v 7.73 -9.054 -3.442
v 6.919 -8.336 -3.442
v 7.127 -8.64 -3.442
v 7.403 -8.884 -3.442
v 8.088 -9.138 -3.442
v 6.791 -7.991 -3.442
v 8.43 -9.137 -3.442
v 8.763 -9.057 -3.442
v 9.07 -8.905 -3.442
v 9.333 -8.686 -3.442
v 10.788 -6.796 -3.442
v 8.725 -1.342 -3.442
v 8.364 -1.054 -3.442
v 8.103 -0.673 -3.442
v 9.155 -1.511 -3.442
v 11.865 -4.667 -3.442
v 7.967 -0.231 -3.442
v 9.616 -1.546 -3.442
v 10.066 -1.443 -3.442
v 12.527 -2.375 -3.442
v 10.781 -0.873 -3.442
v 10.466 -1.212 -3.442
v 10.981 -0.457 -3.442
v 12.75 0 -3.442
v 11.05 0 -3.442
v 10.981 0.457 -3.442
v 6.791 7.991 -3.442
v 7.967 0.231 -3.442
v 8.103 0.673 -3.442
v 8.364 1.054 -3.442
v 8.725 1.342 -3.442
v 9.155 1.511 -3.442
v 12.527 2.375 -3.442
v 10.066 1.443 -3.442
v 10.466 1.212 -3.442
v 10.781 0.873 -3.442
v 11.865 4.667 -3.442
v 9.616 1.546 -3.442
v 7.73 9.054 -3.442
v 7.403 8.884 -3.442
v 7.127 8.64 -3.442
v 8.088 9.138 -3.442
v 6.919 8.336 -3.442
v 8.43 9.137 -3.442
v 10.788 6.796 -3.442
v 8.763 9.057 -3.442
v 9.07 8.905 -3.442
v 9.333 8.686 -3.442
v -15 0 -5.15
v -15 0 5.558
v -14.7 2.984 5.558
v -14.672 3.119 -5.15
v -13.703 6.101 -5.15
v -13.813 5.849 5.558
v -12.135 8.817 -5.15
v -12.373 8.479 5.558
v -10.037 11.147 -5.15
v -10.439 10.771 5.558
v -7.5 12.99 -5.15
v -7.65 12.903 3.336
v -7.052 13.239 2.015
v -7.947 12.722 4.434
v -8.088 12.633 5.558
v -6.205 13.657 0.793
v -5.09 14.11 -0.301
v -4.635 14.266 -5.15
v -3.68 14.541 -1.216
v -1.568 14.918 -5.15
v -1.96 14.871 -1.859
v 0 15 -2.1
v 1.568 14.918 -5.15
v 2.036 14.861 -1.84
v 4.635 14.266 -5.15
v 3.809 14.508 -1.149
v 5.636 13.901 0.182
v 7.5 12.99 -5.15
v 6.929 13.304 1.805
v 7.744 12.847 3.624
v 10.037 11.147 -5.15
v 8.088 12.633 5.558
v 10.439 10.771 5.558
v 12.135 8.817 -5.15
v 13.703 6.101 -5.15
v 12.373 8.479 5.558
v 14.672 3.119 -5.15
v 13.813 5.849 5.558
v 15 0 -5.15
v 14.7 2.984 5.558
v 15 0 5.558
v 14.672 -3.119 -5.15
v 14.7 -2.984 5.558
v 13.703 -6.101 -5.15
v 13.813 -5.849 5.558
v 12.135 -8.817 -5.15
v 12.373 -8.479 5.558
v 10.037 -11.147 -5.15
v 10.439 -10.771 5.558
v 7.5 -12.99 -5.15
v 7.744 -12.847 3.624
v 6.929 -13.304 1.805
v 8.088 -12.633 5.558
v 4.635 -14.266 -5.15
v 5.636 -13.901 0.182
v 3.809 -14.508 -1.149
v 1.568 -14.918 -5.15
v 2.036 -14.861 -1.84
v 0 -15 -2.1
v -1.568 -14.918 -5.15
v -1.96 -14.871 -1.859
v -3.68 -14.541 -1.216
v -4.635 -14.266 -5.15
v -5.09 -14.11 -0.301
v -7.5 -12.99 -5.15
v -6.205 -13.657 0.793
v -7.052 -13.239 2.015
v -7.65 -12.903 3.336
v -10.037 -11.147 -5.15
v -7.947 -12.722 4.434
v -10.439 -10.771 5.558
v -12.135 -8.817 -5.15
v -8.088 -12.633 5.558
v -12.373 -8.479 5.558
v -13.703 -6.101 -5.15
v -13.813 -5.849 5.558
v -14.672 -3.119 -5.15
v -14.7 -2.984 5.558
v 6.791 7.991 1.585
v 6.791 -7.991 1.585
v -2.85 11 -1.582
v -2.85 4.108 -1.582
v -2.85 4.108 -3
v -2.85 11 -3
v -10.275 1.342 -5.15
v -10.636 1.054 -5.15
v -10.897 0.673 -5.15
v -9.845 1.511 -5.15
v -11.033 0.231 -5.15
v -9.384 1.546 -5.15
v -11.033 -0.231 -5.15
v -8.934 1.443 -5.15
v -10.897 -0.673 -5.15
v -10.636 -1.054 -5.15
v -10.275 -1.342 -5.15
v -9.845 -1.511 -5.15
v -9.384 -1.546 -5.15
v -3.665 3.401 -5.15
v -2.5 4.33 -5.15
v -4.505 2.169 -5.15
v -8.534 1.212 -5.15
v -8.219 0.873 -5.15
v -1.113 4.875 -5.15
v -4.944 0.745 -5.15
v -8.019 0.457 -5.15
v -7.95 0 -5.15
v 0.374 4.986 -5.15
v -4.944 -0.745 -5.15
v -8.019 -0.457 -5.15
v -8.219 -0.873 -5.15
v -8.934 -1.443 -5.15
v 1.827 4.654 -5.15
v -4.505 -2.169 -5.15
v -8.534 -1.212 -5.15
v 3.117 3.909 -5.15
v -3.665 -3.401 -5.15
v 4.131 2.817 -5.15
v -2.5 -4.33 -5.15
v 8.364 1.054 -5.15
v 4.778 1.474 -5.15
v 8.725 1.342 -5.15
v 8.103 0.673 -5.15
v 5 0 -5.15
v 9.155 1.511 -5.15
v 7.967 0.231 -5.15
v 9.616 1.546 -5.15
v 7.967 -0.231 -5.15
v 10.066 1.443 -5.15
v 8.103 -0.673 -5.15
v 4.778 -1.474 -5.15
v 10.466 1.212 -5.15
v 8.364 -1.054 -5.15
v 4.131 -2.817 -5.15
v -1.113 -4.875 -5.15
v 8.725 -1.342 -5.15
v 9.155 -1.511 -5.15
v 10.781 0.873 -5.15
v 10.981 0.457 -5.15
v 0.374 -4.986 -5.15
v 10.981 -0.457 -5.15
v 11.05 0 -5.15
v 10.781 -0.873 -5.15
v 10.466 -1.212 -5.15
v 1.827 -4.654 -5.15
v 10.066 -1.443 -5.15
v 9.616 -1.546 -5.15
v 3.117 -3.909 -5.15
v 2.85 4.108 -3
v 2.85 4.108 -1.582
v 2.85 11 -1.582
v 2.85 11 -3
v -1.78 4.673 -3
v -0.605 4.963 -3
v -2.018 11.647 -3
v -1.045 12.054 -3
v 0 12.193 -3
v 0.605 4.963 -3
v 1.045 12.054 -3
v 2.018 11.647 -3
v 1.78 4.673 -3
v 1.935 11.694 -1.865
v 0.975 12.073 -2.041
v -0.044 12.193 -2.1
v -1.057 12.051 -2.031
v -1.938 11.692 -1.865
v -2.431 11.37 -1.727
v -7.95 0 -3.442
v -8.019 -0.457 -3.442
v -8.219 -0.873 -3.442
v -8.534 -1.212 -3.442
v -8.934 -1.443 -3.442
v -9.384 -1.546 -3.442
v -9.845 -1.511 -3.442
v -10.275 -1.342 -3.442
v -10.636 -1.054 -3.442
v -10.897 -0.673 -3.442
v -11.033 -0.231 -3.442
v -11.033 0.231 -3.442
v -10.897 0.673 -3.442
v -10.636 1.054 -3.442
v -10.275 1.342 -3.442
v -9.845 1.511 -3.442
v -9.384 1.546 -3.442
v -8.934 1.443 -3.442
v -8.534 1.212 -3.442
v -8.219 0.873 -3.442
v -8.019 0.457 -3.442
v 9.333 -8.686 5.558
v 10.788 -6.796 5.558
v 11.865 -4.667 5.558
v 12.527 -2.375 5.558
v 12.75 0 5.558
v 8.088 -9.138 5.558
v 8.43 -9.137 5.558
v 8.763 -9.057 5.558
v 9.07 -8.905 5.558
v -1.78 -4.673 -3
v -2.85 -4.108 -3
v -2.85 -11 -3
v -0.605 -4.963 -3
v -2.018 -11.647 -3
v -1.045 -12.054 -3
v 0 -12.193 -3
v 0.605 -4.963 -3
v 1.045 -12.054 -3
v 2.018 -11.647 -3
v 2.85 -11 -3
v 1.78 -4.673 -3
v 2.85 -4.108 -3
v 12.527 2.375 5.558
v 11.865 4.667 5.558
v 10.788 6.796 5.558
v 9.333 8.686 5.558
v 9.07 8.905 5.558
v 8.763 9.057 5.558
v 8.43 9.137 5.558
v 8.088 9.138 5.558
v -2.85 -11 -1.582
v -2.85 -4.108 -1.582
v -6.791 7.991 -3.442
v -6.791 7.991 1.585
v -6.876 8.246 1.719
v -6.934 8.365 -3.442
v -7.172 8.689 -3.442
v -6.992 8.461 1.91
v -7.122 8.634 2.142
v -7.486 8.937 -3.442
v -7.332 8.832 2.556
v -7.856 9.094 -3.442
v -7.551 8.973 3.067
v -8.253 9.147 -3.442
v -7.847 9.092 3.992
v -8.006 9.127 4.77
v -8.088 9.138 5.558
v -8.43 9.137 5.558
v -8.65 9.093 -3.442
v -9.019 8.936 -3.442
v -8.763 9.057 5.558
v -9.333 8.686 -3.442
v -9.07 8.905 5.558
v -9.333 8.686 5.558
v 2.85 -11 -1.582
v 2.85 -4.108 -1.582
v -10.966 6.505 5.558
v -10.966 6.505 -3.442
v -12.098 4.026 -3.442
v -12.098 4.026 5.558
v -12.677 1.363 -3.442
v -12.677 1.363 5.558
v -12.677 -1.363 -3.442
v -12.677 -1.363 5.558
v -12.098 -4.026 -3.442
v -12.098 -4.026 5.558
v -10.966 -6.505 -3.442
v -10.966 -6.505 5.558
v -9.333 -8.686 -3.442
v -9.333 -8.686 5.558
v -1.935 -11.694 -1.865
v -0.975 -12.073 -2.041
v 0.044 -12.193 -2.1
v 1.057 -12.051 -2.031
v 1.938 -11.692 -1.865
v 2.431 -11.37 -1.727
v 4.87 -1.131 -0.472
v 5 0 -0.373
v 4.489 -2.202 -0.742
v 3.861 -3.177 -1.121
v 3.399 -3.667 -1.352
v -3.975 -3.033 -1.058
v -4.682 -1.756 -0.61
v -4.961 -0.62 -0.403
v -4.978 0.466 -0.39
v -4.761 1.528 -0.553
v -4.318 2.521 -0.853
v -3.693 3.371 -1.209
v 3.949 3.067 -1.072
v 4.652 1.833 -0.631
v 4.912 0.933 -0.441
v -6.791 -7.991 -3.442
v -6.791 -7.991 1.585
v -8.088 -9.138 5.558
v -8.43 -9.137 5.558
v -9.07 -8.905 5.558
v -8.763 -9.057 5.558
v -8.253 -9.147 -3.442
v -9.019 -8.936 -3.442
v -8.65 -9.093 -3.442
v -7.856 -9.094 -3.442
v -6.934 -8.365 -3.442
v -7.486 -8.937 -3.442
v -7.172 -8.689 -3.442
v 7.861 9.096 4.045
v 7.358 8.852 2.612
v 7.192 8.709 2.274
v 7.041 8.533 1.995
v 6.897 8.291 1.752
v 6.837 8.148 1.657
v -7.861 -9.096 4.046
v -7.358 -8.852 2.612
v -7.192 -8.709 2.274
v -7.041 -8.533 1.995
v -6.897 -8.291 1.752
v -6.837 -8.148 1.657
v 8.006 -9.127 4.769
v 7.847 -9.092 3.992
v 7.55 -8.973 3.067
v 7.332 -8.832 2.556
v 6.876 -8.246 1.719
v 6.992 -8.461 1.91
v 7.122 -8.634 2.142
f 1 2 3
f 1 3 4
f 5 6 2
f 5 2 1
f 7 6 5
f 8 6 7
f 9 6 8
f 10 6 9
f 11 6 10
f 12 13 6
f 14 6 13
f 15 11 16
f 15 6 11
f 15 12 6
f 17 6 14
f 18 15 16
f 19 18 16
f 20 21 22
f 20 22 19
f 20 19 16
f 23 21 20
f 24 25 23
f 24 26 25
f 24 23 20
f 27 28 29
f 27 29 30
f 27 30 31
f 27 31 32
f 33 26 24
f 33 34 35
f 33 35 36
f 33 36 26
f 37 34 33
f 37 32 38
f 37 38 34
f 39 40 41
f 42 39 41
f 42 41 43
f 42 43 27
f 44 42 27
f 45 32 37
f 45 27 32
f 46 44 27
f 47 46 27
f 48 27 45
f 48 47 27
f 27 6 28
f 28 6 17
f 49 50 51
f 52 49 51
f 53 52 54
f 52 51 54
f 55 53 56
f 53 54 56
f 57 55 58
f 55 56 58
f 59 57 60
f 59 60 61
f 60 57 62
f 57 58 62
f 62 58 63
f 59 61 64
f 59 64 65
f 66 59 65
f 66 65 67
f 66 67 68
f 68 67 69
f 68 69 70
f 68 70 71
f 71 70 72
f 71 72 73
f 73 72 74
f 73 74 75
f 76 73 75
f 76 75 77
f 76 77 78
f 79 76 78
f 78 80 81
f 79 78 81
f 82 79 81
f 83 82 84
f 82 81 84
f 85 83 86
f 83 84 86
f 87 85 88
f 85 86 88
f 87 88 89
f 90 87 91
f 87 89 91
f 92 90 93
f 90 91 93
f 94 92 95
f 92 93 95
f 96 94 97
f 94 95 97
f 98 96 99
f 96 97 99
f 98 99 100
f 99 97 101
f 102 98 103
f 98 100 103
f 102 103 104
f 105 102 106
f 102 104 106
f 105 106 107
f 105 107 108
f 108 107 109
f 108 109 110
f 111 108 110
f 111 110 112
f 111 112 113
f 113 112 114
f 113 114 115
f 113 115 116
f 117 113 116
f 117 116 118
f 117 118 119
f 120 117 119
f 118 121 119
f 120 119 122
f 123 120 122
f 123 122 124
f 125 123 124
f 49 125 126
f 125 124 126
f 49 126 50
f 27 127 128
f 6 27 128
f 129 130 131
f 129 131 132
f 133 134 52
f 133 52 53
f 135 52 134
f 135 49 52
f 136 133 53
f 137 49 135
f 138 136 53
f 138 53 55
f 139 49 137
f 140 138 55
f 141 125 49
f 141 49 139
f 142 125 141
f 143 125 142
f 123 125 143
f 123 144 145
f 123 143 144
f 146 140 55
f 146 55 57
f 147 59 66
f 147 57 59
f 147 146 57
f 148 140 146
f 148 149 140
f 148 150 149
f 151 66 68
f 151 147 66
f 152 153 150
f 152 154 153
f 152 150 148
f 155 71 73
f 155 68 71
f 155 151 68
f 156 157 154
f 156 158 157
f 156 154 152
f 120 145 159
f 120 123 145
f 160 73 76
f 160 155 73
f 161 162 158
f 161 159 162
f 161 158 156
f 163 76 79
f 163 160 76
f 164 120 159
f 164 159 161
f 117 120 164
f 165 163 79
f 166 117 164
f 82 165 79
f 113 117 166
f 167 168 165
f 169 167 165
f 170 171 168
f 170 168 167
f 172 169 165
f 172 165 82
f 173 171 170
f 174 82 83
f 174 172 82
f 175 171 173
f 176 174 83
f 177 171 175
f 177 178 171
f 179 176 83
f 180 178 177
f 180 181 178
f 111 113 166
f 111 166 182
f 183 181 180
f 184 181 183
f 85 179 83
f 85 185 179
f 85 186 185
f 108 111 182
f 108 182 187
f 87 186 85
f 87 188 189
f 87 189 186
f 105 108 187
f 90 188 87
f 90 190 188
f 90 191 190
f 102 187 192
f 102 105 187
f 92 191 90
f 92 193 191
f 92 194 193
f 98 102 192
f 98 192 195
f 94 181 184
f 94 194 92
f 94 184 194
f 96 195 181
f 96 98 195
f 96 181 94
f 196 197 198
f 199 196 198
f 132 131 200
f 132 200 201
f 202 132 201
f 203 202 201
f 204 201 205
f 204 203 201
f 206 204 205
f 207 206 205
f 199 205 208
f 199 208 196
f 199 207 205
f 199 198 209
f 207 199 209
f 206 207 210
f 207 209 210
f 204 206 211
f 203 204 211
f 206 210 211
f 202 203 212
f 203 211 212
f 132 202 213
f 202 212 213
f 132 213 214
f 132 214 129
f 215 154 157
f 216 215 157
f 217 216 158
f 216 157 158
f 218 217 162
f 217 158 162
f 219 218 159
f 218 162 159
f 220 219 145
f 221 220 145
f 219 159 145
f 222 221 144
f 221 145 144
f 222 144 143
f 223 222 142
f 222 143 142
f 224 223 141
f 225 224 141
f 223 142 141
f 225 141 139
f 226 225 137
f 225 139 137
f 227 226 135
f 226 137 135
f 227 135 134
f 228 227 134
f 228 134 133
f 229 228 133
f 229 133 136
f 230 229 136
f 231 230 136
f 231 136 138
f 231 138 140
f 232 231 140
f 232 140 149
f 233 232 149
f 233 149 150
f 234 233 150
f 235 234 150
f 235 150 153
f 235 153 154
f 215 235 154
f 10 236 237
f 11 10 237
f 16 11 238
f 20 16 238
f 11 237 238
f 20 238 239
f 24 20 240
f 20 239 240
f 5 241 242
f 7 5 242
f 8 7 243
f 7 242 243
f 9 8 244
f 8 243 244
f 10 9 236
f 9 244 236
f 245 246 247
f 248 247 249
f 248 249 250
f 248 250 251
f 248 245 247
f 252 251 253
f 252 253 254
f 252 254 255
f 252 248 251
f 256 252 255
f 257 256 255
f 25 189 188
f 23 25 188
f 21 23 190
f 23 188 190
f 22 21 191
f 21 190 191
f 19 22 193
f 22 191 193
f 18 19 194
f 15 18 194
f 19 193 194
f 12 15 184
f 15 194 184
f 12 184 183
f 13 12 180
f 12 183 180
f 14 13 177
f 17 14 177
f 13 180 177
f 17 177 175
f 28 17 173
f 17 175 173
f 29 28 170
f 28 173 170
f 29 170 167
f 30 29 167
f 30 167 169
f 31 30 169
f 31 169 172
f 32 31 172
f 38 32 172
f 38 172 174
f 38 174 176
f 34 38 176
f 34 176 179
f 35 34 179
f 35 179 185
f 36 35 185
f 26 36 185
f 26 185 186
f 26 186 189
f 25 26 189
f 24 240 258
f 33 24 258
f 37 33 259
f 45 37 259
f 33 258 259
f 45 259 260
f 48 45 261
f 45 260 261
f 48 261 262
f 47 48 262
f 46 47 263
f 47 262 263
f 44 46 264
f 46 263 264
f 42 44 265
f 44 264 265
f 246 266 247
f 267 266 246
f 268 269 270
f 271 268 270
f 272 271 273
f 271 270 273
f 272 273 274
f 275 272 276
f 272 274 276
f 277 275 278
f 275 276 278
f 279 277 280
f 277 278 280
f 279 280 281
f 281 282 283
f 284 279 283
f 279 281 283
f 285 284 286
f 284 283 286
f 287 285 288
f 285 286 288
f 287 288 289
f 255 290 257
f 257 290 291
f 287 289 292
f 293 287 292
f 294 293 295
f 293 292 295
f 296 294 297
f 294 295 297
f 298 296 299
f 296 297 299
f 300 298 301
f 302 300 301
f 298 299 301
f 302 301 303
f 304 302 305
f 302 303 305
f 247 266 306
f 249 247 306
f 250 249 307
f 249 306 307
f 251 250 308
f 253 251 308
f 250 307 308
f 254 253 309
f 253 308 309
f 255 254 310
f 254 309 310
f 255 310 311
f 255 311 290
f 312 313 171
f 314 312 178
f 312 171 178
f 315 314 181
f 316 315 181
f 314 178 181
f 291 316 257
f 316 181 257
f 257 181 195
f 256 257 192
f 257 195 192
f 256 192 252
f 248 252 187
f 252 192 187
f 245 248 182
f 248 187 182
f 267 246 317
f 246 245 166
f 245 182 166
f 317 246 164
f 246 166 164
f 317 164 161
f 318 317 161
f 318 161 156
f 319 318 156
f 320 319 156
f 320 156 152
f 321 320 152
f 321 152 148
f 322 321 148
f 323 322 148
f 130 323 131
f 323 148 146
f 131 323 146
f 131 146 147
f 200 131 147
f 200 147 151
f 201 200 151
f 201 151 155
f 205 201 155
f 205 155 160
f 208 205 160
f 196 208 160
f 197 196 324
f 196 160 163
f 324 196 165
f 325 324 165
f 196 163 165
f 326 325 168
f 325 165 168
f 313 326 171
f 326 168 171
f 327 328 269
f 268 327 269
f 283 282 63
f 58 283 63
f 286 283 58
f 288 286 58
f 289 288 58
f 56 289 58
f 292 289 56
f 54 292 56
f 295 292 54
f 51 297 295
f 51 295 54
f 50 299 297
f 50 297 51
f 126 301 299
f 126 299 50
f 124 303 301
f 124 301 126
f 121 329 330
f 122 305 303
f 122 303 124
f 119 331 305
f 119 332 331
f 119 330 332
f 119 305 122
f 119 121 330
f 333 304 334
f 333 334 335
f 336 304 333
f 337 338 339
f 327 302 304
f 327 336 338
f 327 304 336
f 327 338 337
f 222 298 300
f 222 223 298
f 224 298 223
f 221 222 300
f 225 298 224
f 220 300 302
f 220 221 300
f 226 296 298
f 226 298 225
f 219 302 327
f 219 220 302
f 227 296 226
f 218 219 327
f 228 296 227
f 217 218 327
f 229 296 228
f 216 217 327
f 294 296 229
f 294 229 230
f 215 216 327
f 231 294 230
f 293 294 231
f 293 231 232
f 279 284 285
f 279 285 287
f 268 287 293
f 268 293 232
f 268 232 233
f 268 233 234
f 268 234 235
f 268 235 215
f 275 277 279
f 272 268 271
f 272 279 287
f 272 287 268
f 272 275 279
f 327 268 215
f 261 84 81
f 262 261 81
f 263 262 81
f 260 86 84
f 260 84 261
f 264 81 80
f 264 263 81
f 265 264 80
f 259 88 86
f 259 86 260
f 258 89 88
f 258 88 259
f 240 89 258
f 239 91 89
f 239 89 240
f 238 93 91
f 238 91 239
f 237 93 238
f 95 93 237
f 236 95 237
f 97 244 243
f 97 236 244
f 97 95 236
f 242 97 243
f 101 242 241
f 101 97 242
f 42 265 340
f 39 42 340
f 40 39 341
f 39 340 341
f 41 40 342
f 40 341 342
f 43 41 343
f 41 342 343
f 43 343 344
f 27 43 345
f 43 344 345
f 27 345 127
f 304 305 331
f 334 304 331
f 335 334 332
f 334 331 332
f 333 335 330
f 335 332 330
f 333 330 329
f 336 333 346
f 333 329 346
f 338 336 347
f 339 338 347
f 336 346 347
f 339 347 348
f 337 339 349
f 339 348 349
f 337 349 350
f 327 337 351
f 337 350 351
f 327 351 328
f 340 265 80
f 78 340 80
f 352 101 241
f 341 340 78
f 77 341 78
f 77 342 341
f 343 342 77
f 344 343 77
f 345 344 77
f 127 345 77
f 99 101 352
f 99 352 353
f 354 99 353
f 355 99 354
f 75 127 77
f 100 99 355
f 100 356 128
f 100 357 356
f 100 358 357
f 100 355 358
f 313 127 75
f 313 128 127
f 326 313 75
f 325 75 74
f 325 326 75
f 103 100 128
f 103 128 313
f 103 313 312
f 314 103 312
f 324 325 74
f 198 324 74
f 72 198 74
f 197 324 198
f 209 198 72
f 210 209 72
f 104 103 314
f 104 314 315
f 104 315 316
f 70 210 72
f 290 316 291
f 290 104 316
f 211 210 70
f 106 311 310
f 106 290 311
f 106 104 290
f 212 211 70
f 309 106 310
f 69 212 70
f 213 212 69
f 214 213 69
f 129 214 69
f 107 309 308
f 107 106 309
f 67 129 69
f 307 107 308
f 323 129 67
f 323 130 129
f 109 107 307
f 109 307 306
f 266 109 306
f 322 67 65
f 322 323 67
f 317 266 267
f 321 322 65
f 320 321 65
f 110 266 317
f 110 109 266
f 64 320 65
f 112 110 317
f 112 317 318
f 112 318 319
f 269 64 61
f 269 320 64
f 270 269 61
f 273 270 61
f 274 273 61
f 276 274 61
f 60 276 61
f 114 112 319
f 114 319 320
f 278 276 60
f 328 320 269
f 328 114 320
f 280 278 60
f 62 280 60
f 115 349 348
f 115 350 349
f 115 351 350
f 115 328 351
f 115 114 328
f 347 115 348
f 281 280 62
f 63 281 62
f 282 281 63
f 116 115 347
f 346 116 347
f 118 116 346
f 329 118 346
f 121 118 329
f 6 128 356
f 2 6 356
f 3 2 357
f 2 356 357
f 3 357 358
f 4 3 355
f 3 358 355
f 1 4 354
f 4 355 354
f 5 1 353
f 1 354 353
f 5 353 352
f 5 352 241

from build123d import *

# Parameters (mm, degrees)
F1_DEPTH  = 15
F3_DEPTH  = 12
F5_DEPTH  = 9
F6_R      = 5
F7_DEPTH  = 12
F8_R      = 1.55
F9_DEPTH  = 12
F10_W     = 5.7
F10_H     = 22
F11_DEPTH = 3
F12_R     = 15
F12_R_2   = 1.55
F12_R_3   = 5
F13_DEPTH = 0.85


with BuildPart() as f1:
    # F0 (on Front) → F1 (new body, symmetric)
    with BuildSketch(Plane.XZ):
        with BuildLine():
            Line((-15, -6), (0, -6))
            Line((0, -6), (0, -2.1))
            ThreePointArc((0, -2.1), (-5.5691301799, 0.1182664936), (-8.0879356988, 5.5580767803))
            Line((-8.0879356988, 5.5580767803), (-15, 5.5580767803))
            Line((-15, 5.5580767803), (-15, -6))
        make_face()
        with BuildLine():
            Line((0, -6), (15, -6))
            Line((15, -6), (15, 5.5580767803))
            Line((15, 5.5580767803), (8.0879356988, 5.5580767803))
            ThreePointArc((8.0879356988, 5.5580767803), (5.5691301799, 0.1182664936), (0, -2.1))
            Line((0, -2.1), (0, -6))
        make_face()
    extrude(amount=F1_DEPTH, both=True)

    # F2 (on face) → F3 (cut)
    with BuildSketch(Plane.XY.offset(5.5580767803)):
        with BuildLine():
            Line((-8.0879356988, -15), (-8.0879356988, -12.6327073952))
            ThreePointArc((-8.0879356988, -12.6327073952), (-13.1590089963, -7.2000334884), (-15, 3.9e-09))
            Line((-15, 3.9e-09), (-15, -15))
            Line((-15, -15), (-8.0879356988, -15))
        make_face()
        with BuildLine():
            Line((-8.0879356988, -15), (0, -15))
            ThreePointArc((0, -15), (-4.2136319887, -14.396017), (-8.0879356988, -12.6327073952))
            Line((-8.0879356988, -12.6327073952), (-8.0879356988, -15))
        make_face()
        with BuildLine():
            ThreePointArc((-15, 3.9e-09), (-13.1590089945, 7.2000334918), (-8.0879356988, 12.6327073952))
            Line((-8.0879356988, 12.6327073952), (-8.0879356988, 15))
            Line((-8.0879356988, 15), (-15, 15))
            Line((-15, 15), (-15, 3.9e-09))
        make_face()
        with BuildLine():
            ThreePointArc((-8.0879356988, 12.6327073952), (-4.2136319887, 14.396017), (0, 15))
            Line((0, 15), (-8.0879356988, 15))
            Line((-8.0879356988, 15), (-8.0879356988, 12.6327073952))
        make_face()
        with BuildLine():
            ThreePointArc((0, 15), (10.6066017178, 10.6066017178), (15, 0))
            Line((15, 0), (15, 15))
            Line((15, 15), (0, 15))
        make_face()
        with BuildLine():
            Line((15, -15), (15, 0))
            ThreePointArc((15, 0), (10.6066017178, -10.6066017178), (0, -15))
            Line((0, -15), (15, -15))
        make_face()
    extrude(amount=-F3_DEPTH, mode=Mode.SUBTRACT)

    # F4 (on face) → F5 (cut)
    with BuildSketch(Plane.XY.offset(5.5580767803)):
        with BuildLine():
            ThreePointArc((-6.7912821949, 7.9907824623), (-7.8555088498, 9.0941072404), (-9.3332321619, 8.6863845995))
            ThreePointArc((-9.3332321619, 8.6863845995), (-12.75, 0), (-9.3332321619, -8.6863845995))
            ThreePointArc((-9.3332321619, -8.6863845995), (-7.8555088498, -9.0941072404), (-6.7912821949, -7.9907824623))
            Line((-6.7912821949, -7.9907824623), (-6.7912821949, 7.9907824623))
        make_face()
        with BuildLine():
            ThreePointArc((9.3332321619, -8.6863845995), (11.8651002959, -4.6671077733), (12.75, 0))
            ThreePointArc((12.75, 0), (11.8651002959, 4.6671077733), (9.3332321619, 8.6863845995))
            ThreePointArc((9.3332321619, 8.6863845995), (8.7631851378, 9.0573015192), (8.0879356988, 9.1383642487))
            Line((8.0879356988, 9.1383642487), (8.0879356988, -9.1383642487))
            ThreePointArc((8.0879356988, -9.1383642487), (8.7631851378, -9.0573015192), (9.3332321619, -8.6863845995))
        make_face()
        with BuildLine():
            Line((8.0879356988, -9.1383642487), (8.0879356988, 9.1383642487))
            ThreePointArc((8.0879356988, 9.1383642487), (7.2573018203, 8.7705623118), (6.7912821949, 7.9907824623))
            Line((6.7912821949, 7.9907824623), (6.7912821949, -7.9907824623))
            ThreePointArc((6.7912821949, -7.9907824623), (7.2573018203, -8.7705623118), (8.0879356988, -9.1383642487))
        make_face()
    extrude(amount=-F5_DEPTH, mode=Mode.SUBTRACT)

    # F6 (on face) → F7 (cut)
    with BuildSketch(Plane(origin=(0, 0, -6), x_dir=(1, 0, 0), z_dir=(0, 0, -1))):
        Circle(F6_R)
    extrude(amount=-F7_DEPTH, mode=Mode.SUBTRACT)

    # F8 (on face) → F9 (cut)
    with BuildSketch(Plane(origin=(0, 0, -6), x_dir=(1, 0, 0), z_dir=(0, 0, -1))):
        with Locations((-9.5, 0)):
            Circle(F8_R)
        with Locations((9.5, 0)):
            Circle(F8_R)
    extrude(amount=-F9_DEPTH, mode=Mode.SUBTRACT)

    # F10 (on Top) → F11 (cut)
    with BuildSketch(Plane.XY):
        Rectangle(F10_W, F10_H)
        with BuildLine():
            Line((-2.85, 11), (2.85, 11))
            ThreePointArc((2.85, 11), (0, 12.1933115599), (-2.85, 11))
        make_face()
        with BuildLine():
            ThreePointArc((-2.85, -11), (0, -12.1933115599), (2.85, -11))
            Line((2.85, -11), (-2.85, -11))
        make_face()
    extrude(amount=-F11_DEPTH, mode=Mode.SUBTRACT)

    # F12 (on face) → F13 (cut)
    with BuildSketch(Plane(origin=(0, 0, -6), x_dir=(1, 0, 0), z_dir=(0, 0, -1))):
        Circle(F12_R)
        with Locations((-9.5, 0)):
            Circle(F12_R_2, mode=Mode.SUBTRACT)
        Circle(F12_R_3, mode=Mode.SUBTRACT)
        with Locations((9.5, 0)):
            Circle(F12_R_2, mode=Mode.SUBTRACT)
    extrude(amount=-F13_DEPTH, mode=Mode.SUBTRACT)


solid = f1.part
